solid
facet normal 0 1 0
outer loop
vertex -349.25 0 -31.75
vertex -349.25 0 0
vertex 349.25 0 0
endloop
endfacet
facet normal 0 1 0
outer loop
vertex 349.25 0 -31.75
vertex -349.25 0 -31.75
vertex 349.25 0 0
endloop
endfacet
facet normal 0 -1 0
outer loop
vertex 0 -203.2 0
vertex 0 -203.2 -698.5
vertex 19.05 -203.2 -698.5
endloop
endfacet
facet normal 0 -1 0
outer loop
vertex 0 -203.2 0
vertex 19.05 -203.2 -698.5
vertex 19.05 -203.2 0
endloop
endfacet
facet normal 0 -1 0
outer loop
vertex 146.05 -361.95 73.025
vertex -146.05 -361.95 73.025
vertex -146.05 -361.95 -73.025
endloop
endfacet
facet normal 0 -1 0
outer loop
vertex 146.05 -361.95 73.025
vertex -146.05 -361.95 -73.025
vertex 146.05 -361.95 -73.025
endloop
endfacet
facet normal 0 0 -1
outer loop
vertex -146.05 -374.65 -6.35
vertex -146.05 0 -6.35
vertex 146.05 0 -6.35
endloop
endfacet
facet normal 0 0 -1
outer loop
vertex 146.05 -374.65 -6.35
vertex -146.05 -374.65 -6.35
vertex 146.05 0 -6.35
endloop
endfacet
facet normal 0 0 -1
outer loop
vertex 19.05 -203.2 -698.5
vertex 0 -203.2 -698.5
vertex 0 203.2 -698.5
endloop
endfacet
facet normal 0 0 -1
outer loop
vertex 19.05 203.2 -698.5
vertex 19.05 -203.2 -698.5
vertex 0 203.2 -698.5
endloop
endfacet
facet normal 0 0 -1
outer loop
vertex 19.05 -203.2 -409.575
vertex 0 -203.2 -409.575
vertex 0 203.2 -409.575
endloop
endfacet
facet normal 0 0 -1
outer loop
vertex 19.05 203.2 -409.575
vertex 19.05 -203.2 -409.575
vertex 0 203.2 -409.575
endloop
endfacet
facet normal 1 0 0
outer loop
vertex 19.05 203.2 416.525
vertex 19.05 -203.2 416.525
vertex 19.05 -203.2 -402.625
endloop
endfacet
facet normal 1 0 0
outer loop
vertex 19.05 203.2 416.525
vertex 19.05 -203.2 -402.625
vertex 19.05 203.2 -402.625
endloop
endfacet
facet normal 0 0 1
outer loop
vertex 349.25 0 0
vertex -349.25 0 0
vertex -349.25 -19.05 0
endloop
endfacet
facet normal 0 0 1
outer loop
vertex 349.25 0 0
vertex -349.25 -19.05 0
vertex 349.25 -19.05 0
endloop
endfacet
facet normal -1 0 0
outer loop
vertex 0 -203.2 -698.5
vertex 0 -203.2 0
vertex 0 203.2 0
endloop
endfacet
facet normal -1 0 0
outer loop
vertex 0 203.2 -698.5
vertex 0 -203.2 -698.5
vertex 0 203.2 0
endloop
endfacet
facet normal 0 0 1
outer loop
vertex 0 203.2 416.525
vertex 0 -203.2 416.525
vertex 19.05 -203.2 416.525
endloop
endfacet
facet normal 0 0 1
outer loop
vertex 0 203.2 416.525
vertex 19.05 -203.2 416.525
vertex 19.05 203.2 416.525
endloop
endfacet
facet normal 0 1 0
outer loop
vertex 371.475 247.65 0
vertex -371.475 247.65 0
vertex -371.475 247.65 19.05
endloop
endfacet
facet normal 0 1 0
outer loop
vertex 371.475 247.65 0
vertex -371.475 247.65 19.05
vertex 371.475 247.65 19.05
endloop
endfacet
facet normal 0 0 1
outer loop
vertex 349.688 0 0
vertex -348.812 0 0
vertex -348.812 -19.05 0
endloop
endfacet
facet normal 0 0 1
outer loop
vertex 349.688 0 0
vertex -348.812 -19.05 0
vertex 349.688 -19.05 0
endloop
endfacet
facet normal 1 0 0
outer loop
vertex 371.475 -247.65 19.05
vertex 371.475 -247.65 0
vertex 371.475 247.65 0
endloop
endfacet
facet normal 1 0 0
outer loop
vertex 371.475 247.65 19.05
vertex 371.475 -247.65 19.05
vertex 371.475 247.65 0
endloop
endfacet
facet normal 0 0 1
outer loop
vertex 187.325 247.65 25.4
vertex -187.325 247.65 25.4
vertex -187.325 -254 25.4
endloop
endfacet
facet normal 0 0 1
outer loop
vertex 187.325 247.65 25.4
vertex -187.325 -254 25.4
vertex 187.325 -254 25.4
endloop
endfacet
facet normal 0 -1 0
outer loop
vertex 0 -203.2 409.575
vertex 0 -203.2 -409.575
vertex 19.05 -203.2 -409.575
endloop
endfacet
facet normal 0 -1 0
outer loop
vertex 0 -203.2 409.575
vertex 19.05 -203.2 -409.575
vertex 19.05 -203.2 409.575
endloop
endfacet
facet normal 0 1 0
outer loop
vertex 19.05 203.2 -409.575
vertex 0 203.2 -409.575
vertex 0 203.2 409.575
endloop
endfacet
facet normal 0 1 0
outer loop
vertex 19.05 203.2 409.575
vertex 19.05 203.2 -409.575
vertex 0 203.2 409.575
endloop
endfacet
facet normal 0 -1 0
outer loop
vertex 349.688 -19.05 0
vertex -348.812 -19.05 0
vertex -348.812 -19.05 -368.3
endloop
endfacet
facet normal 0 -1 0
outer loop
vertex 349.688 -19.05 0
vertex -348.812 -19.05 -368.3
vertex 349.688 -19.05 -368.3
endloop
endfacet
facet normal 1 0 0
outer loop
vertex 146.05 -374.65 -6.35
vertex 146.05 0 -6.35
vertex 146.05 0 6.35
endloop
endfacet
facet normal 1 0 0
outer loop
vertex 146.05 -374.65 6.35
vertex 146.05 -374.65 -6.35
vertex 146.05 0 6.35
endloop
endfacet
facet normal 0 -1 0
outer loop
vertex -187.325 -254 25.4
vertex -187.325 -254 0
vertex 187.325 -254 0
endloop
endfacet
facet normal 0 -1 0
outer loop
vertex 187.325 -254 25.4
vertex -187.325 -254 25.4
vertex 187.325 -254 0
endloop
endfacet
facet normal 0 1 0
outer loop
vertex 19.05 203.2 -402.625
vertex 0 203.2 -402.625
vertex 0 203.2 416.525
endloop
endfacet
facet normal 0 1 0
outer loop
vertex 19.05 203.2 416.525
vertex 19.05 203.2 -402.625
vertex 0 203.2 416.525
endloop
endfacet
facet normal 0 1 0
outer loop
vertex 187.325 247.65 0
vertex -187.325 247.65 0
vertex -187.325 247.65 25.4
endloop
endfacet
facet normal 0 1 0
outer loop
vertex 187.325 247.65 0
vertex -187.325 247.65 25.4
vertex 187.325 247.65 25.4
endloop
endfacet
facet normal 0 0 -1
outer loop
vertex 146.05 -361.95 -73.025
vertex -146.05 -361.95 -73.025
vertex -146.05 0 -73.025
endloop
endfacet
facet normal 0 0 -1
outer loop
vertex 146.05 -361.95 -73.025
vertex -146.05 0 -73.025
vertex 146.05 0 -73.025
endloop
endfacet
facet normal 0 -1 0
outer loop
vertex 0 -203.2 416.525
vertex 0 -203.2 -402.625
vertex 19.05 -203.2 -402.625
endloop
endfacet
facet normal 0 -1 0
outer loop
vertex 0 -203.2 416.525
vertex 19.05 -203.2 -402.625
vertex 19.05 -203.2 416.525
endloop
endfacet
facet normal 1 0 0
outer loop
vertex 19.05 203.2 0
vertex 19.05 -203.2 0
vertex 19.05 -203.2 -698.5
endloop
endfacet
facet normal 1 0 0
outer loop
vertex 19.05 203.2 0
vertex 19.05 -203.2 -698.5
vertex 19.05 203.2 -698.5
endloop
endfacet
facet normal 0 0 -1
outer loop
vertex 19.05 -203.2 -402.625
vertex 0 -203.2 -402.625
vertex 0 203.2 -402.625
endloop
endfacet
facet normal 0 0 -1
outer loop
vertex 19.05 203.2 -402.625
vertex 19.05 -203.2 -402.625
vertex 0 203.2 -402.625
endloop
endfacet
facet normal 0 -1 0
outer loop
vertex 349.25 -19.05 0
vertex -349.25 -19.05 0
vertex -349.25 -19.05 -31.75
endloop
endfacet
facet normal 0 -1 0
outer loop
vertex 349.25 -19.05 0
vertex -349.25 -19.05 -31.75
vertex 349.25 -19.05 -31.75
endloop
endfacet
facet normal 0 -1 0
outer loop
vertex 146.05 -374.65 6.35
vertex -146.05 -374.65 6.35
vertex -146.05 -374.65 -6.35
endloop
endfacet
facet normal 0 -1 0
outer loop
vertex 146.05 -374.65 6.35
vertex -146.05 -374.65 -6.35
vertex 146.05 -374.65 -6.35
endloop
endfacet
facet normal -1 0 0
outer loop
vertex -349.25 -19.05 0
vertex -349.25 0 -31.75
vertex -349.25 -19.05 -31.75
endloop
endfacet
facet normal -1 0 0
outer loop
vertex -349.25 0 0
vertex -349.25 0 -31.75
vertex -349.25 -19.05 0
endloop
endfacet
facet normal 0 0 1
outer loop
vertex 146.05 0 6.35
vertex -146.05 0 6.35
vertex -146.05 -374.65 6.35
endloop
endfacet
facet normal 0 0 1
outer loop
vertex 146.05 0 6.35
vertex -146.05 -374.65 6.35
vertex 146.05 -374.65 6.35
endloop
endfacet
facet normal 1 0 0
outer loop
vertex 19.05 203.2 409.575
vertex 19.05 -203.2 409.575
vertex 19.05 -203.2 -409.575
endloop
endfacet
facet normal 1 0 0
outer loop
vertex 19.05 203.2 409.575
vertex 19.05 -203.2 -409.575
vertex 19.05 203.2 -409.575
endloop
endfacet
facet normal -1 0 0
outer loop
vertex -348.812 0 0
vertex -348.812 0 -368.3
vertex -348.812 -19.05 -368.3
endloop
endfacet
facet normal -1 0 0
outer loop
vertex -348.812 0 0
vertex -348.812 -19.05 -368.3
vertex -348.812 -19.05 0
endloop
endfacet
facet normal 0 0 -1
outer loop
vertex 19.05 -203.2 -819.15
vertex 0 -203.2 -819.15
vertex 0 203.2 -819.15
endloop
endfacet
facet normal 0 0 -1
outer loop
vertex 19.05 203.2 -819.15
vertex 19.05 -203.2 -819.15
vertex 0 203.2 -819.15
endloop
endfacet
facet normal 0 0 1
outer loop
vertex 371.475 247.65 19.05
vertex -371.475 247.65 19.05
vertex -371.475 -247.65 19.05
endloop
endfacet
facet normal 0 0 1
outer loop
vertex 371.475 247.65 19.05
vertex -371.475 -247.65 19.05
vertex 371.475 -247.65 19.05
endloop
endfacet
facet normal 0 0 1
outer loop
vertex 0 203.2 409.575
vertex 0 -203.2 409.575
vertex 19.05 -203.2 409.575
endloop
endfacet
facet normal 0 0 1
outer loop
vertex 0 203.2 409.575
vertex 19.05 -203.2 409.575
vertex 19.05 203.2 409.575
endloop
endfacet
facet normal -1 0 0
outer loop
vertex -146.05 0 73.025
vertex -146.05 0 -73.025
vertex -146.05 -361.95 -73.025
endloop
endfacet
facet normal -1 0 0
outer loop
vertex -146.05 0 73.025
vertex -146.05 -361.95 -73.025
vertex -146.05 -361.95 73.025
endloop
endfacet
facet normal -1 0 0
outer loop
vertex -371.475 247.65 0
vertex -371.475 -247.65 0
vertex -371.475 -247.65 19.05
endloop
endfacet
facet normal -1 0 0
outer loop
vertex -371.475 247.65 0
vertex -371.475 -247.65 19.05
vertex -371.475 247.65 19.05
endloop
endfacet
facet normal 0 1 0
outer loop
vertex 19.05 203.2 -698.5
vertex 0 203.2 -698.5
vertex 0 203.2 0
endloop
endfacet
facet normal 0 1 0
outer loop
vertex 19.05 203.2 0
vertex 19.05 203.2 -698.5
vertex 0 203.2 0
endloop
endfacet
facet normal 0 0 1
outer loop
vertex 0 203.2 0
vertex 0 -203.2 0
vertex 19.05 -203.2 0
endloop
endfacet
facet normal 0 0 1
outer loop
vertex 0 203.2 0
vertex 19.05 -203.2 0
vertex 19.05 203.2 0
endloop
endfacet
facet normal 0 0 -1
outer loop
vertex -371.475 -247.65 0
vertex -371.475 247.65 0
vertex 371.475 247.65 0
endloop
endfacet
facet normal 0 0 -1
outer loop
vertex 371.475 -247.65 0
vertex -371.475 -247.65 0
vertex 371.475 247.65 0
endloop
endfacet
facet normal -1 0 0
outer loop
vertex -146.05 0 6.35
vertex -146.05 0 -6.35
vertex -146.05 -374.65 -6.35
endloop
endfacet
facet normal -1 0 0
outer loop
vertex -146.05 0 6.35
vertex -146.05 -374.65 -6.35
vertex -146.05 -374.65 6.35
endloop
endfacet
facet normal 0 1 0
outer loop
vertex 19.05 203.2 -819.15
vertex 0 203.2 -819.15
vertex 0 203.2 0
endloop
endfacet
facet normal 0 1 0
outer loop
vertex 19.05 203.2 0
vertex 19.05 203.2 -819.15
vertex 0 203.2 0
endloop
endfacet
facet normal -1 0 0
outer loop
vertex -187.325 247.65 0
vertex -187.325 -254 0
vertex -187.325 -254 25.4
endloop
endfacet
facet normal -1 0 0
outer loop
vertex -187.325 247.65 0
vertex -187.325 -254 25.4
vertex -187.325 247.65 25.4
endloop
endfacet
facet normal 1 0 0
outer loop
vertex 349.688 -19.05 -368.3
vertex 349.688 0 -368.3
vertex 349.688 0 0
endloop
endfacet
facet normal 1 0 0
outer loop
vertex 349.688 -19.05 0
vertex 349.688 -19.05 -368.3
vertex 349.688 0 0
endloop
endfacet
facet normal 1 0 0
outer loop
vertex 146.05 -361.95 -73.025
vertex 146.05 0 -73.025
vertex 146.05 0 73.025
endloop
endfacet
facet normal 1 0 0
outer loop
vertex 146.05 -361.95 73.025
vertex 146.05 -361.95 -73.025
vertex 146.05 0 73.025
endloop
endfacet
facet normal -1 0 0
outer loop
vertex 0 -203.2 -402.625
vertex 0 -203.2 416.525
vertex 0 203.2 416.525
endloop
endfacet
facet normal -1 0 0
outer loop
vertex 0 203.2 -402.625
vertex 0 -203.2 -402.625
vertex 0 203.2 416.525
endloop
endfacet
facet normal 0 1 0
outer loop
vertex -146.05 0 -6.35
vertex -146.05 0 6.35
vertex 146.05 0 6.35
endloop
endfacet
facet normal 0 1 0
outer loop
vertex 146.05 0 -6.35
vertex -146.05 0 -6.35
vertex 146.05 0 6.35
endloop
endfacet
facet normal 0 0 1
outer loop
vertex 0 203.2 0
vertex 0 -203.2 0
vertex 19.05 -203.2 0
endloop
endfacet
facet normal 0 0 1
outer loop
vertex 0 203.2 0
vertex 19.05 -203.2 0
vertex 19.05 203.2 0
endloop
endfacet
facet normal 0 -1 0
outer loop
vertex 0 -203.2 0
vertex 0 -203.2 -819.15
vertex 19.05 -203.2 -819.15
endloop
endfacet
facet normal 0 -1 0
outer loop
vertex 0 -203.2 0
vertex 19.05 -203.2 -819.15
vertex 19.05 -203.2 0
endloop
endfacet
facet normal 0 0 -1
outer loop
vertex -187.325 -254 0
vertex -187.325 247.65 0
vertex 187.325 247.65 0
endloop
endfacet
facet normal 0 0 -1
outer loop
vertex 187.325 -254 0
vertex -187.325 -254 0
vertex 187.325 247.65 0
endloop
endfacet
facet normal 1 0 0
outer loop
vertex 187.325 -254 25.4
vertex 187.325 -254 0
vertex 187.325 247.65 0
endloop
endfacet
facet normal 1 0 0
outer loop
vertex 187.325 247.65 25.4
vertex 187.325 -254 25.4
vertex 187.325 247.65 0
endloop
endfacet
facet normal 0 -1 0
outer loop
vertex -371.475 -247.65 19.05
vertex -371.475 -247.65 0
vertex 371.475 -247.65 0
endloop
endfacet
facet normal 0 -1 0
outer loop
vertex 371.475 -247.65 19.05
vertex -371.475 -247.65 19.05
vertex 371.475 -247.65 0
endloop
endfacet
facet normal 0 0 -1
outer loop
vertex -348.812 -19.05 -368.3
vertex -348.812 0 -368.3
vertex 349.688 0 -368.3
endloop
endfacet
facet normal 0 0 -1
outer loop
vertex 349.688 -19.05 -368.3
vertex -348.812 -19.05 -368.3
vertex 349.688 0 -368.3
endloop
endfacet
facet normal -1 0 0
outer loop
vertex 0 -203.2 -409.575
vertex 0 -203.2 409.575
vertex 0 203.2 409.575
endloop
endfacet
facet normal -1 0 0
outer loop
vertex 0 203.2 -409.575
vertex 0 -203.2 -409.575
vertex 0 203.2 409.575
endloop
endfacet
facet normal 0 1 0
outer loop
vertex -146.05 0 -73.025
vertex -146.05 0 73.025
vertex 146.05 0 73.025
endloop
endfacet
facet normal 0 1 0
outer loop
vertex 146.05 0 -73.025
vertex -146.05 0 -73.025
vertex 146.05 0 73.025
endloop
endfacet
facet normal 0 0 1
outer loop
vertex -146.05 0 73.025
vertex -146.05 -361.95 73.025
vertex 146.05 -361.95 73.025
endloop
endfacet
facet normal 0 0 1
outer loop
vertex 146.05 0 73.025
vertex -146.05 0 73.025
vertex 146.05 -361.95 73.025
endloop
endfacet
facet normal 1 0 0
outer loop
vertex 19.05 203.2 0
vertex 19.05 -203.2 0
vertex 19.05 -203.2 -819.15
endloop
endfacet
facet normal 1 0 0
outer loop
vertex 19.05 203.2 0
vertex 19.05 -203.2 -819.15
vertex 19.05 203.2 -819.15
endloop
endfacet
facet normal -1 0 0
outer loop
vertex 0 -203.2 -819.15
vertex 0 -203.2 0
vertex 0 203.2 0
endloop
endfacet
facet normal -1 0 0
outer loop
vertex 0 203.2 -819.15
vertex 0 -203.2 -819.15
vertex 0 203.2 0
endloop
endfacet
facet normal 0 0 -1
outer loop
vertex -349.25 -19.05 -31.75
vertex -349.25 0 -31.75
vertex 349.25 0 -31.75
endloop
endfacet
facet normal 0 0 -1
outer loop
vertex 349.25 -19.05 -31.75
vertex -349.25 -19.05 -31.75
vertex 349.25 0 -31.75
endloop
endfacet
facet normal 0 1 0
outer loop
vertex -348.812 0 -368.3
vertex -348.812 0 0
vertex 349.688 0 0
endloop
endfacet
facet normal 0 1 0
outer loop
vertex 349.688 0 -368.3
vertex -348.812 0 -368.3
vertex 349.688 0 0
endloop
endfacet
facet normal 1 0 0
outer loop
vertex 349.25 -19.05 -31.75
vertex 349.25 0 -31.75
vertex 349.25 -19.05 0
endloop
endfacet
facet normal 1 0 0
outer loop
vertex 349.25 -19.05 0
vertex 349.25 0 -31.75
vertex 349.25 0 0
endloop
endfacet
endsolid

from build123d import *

# Parameters (mm, degrees)
F0_W      = 742.95
F0_H      = 495.3
F1_DEPTH  = 19.05
F2_W      = 698.5
F2_H      = 31.75
F3_DEPTH  = 19.05
F4_W      = 406.4
F4_H      = 819.15
F5_DEPTH  = 19.05
F6_W      = 406.4
F6_H      = 698.5
F7_DEPTH  = 19.05
F8_W      = 698.5
F8_H      = 368.3
F9_DEPTH  = 19.05
F10_W     = 374.65
F10_H     = 501.65
F11_DEPTH = 25.4
F12_W     = 406.4
F12_H     = 819.15
F13_DEPTH = 19.05
F14_W     = 406.4
F14_H     = 819.15
F15_DEPTH = 19.05
F16_W     = 292.1
F16_H     = 146.05
F17_DEPTH = 361.95
F18_W     = 292.1
F18_H     = 12.7
F19_DEPTH = 374.65


with BuildPart() as f1:
    # F0 (on Top) → F1 (new body)
    with BuildSketch(Plane.XY):
        Rectangle(F0_W, F0_H)
    extrude(amount=F1_DEPTH)


with BuildPart() as f3:
    # F2 (on Front) → F3 (new body)
    with BuildSketch(Plane.XZ):
        with Locations((0, -15.875)):
            Rectangle(F2_W, F2_H)
    extrude(amount=F3_DEPTH)


with BuildPart() as f5:
    # F4 (on Right) → F5 (new body)
    with BuildSketch(Plane.YZ):
        with Locations((0, -409.575)):
            Rectangle(F4_W, F4_H)
    extrude(amount=F5_DEPTH)


with BuildPart() as f7:
    # F6 (on Right) → F7 (new body)
    with BuildSketch(Plane.YZ):
        with Locations((0, -349.25)):
            Rectangle(F6_W, F6_H)
    extrude(amount=F7_DEPTH)


with BuildPart() as f9:
    # F8 (on Front) → F9 (new body)
    with BuildSketch(Plane.XZ):
        with Locations((0.437908, -184.15)):
            Rectangle(F8_W, F8_H)
    extrude(amount=F9_DEPTH)


with BuildPart() as f11:
    # F10 (on Top) → F11 (new body)
    with BuildSketch(Plane.XY):
        with Locations((0, -3.175)):
            Rectangle(F10_W, F10_H)
    extrude(amount=F11_DEPTH)


with BuildPart() as f13:
    # F12 (on Right) → F13 (new body)
    with BuildSketch(Plane.YZ):
        with Locations((0, 6.950023)):
            Rectangle(F12_W, F12_H)
    extrude(amount=F13_DEPTH)


with BuildPart() as f15:
    # F14 (on Right) → F15 (new body)
    with BuildSketch(Plane.YZ):
        Rectangle(F14_W, F14_H)
    extrude(amount=F15_DEPTH)


with BuildPart() as f17:
    # F16 (on Front) → F17 (new body)
    with BuildSketch(Plane.XZ):
        Rectangle(F16_W, F16_H)
    extrude(amount=F17_DEPTH)


with BuildPart() as f19:
    # F18 (on Front) → F19 (new body)
    with BuildSketch(Plane.XZ):
        Rectangle(F18_W, F18_H)
    extrude(amount=F19_DEPTH)


solid = Compound([f1.part, f3.part, f5.part, f7.part, f9.part, f11.part, f13.part, f15.part, f17.part, f19.part])
